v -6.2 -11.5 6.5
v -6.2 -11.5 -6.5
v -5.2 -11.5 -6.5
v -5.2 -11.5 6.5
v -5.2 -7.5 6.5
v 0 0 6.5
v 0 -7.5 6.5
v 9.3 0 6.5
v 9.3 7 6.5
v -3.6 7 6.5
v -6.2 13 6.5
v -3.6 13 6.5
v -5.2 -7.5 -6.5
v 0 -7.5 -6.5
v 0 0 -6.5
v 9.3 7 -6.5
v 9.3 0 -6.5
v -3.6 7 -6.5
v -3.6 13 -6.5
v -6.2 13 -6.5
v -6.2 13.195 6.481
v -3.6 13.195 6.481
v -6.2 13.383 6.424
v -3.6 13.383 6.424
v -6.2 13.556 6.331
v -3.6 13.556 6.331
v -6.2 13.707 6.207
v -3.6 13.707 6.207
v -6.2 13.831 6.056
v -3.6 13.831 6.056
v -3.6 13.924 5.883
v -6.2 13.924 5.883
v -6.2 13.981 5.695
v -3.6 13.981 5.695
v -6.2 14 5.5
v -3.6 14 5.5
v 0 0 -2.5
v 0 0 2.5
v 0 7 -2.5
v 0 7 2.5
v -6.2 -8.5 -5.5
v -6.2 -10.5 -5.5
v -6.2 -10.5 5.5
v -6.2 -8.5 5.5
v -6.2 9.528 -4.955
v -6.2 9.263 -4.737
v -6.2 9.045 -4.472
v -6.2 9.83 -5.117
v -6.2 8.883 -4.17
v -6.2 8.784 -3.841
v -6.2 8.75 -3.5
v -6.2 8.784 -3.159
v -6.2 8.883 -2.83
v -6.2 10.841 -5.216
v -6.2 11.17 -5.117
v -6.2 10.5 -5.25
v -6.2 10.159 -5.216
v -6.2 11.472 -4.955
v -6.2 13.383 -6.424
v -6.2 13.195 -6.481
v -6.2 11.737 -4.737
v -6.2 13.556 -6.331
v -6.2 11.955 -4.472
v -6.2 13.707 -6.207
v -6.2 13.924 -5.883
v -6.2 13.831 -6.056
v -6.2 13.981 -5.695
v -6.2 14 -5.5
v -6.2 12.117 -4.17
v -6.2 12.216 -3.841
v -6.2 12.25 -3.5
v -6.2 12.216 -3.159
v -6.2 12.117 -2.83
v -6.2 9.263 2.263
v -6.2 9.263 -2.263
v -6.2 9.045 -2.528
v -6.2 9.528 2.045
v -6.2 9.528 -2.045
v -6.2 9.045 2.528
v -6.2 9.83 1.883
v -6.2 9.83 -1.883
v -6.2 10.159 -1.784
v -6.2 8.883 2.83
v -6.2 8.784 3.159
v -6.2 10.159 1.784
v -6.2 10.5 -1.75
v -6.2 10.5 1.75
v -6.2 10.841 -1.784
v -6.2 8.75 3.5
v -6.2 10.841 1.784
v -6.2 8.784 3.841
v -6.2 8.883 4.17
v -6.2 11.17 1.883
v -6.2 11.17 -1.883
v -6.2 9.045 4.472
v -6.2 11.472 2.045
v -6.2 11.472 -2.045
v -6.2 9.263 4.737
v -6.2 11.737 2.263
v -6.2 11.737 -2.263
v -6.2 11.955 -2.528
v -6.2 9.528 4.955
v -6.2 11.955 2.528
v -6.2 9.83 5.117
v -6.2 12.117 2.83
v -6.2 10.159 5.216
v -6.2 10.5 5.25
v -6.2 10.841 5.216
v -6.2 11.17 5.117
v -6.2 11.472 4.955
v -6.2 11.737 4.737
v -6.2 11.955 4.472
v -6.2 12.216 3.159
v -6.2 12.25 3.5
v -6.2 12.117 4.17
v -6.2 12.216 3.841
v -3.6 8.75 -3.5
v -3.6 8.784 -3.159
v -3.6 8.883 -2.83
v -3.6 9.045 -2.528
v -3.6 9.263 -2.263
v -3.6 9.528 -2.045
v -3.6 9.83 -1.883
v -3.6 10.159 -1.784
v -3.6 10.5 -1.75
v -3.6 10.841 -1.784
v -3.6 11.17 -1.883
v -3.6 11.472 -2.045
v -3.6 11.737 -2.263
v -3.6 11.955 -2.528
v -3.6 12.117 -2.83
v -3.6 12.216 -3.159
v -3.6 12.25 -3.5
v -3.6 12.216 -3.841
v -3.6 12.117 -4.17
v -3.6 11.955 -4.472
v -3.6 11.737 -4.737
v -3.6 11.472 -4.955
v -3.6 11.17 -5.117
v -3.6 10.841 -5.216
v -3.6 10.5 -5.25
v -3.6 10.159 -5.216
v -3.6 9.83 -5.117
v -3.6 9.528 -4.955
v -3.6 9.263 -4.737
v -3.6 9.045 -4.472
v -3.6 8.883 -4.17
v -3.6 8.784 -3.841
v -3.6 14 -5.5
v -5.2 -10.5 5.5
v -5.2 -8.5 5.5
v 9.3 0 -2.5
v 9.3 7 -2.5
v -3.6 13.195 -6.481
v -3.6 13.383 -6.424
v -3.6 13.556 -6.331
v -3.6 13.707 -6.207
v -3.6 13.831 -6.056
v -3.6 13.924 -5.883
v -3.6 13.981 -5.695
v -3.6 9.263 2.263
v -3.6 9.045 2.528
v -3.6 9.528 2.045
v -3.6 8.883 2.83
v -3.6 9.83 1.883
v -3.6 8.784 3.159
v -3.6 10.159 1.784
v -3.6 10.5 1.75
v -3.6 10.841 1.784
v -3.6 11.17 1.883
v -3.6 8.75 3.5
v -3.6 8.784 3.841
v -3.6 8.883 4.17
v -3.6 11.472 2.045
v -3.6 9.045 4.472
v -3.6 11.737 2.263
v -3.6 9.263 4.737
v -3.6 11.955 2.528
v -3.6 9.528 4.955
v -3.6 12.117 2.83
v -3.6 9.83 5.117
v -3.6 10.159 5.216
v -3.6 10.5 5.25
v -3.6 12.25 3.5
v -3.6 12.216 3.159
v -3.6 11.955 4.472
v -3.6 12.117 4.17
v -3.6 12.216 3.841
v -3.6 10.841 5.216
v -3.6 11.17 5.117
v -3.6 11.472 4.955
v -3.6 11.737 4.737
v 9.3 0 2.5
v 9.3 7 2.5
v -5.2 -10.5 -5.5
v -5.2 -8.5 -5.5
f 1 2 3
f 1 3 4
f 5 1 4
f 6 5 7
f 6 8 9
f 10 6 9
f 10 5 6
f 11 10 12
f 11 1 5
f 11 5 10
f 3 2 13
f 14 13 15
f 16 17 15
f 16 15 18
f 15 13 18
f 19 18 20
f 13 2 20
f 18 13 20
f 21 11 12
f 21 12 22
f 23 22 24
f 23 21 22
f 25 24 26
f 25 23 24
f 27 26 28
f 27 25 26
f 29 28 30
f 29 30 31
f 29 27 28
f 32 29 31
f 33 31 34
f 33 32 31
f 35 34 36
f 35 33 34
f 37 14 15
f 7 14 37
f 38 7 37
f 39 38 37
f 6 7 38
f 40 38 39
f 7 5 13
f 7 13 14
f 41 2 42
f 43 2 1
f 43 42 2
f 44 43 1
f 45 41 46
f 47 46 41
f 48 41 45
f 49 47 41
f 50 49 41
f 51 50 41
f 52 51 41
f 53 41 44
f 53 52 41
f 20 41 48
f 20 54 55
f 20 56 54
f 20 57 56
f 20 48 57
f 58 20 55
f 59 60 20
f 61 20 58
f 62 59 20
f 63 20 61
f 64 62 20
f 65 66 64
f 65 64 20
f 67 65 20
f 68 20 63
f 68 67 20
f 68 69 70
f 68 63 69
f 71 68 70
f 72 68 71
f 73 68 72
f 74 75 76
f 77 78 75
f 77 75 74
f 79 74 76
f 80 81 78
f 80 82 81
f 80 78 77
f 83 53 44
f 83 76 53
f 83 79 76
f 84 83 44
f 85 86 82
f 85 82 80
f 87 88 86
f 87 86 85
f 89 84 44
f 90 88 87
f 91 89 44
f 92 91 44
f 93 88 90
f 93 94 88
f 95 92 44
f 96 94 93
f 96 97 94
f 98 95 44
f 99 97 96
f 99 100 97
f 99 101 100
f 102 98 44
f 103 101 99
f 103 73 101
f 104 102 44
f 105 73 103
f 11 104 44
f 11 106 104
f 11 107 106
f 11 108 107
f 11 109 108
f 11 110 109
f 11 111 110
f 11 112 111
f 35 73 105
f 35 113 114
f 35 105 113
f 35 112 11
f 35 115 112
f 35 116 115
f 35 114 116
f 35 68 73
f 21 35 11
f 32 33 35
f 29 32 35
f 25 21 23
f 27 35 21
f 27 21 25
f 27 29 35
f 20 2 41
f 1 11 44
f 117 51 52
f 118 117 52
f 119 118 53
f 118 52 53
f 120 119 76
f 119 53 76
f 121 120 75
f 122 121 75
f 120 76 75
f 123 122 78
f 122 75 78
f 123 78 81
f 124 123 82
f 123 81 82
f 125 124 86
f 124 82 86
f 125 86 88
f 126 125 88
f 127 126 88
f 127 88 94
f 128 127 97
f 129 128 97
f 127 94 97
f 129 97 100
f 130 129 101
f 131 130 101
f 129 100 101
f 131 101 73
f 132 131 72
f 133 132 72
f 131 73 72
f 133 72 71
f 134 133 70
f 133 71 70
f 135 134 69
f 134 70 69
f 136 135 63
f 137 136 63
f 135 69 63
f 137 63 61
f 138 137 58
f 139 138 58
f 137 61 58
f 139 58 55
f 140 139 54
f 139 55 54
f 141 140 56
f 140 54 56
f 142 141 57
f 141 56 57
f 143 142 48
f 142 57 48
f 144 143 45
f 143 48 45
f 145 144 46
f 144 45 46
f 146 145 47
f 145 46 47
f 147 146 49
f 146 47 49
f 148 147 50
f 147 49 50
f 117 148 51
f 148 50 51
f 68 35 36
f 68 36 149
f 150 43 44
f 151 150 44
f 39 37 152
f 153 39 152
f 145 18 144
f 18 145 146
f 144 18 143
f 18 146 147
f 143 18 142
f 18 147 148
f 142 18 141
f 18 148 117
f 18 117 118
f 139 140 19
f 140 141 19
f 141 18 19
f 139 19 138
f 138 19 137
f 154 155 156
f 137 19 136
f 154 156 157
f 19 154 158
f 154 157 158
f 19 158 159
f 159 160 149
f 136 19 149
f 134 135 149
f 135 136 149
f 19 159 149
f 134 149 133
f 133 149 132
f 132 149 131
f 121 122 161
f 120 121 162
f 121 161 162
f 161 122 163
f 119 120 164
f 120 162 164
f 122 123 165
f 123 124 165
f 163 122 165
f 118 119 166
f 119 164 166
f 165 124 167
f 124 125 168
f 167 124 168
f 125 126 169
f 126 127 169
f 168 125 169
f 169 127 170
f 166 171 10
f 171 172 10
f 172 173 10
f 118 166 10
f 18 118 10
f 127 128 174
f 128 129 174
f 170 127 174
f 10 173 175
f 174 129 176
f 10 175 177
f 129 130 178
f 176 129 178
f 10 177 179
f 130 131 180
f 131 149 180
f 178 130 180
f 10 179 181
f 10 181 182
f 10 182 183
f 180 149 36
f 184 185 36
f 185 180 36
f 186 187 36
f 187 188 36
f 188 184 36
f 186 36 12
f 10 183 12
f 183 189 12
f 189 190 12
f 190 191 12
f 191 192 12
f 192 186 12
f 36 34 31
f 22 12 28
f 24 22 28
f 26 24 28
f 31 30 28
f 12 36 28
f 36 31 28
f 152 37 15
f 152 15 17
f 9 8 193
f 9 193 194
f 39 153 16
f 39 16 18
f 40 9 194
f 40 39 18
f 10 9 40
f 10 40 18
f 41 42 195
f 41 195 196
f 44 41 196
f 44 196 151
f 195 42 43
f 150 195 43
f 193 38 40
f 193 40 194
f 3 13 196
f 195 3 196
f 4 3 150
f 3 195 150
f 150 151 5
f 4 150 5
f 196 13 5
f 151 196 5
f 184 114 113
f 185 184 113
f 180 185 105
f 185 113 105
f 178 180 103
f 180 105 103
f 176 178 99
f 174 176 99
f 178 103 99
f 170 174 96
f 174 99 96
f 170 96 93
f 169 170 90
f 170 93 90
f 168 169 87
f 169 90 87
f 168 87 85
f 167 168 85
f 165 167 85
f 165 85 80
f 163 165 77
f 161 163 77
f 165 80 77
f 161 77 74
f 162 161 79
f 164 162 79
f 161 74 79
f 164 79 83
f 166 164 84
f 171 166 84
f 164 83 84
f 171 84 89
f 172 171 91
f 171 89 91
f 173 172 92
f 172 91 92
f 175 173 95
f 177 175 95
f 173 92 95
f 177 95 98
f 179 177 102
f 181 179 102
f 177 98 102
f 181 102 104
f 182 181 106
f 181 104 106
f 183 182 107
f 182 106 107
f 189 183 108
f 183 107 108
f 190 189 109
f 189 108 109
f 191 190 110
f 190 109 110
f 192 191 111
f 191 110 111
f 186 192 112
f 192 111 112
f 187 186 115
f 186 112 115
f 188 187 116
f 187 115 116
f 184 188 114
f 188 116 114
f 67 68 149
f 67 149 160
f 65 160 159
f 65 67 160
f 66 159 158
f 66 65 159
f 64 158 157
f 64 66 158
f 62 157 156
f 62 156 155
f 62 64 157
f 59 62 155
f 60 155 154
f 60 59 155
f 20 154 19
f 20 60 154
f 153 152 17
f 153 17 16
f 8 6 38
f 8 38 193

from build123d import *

# Parameters (mm, degrees)
EXTRUDE_1_DEPTH     = 6.5
SKETCH_2_W          = 9.3
SKETCH_2_H          = 5
CUT_EXTRUDE_1_DEPTH = 14.601102896
SKETCH_3_R          = 1.75
EXTRUDE_2_DEPTH     = 2.6
SKETCH_4_W          = 13
SKETCH_4_H          = 4
SKETCH_4_W_2        = 11
SKETCH_4_H_2        = 2
EXTRUDE_3_DEPTH     = 1


with BuildPart() as part:
    # 草图1 → 凸台-拉伸1 (new, symmetric)
    with BuildSketch(Plane.XY):
        Polygon((0, 0), (9.3, 0), (9.3, 7), (-6.2, 7), (-6.2, -7.5), (0, -7.5), align=None)
    extrude(amount=EXTRUDE_1_DEPTH, both=True)

    # 草图2 → 切除-拉伸1 (cut, through all)
    with BuildSketch(Plane.XZ):
        with Locations((4.65, 0)):
            Rectangle(SKETCH_2_W, SKETCH_2_H)
    extrude(amount=-CUT_EXTRUDE_1_DEPTH, mode=Mode.SUBTRACT)

    # 草图3 → 凸台-拉伸2 (add)
    with BuildSketch(Plane.ZY.offset(6.2)):
        with BuildLine():
            Line((5.5, 14), (-5.5, 14))
            ThreePointArc((-5.5, 14), (-6.207106781, 13.707106781), (-6.5, 13))
            Line((-6.5, 13), (-6.5, 7))
            Line((-6.5, 7), (6.5, 7))
            Line((6.5, 7), (6.5, 13))
            ThreePointArc((6.5, 13), (6.207106781, 13.707106781), (5.5, 14))
        make_face()
        with Locations(Location((-3.5, 10.5, 0), (0, 0, 270))):
            Circle(SKETCH_3_R, mode=Mode.SUBTRACT)
        with Locations(Location((3.5, 10.5, 0), (0, 0, 90))):
            Circle(SKETCH_3_R, mode=Mode.SUBTRACT)
    extrude(amount=-EXTRUDE_2_DEPTH)

    # 草图4 → 凸台-拉伸3 (add)
    with BuildSketch(Plane.ZY.offset(6.2)):
        with Locations((0, -9.5)):
            Rectangle(SKETCH_4_W, SKETCH_4_H)
        with Locations((0, -9.5)):
            Rectangle(SKETCH_4_W_2, SKETCH_4_H_2, mode=Mode.SUBTRACT)
    extrude(amount=-EXTRUDE_3_DEPTH)


solid = part.part
